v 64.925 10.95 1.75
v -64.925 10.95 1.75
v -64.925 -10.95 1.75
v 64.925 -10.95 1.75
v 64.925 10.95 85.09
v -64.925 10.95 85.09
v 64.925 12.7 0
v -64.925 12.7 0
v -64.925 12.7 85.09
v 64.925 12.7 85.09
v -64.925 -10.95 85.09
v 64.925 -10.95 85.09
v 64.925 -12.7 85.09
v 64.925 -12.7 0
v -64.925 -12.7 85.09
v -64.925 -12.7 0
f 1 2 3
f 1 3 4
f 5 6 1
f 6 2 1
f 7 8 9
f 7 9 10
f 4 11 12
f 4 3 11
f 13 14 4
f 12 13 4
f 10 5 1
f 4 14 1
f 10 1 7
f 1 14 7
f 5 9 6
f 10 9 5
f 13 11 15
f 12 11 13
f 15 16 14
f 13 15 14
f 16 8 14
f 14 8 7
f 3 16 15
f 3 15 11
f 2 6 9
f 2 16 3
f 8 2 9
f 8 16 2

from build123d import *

# Parameters (mm, degrees)
F0_W     = 133.35
F0_H     = 25.4
F1_DEPTH = 85.09
F2_T     = -1.75
F3_DEPTH = 1.75
F4_DEPTH = 1.75


with BuildPart() as f1:
    # F0 (on Top) → F1 (new body)
    with BuildSketch(Plane.XY):
        Rectangle(F0_W, F0_H)
    extrude(amount=F1_DEPTH)

    # F2
    f2_openings = [f1.faces().sort_by_distance(p)[0] for p in [
        (0, 0, 85.09),
    ]]
    offset(amount=F2_T, openings=f2_openings)

    # F3 (cut): a face of the model
    f3_faces = [f1.faces().sort_by_distance(p)[0] for p in [
        (-66.675, 0, 42.545),
    ]]
    extrude(f3_faces, amount=-F3_DEPTH, mode=Mode.SUBTRACT)

    # F4 (cut): a face of the model
    f4_faces = [f1.faces().sort_by_distance(p)[0] for p in [
        (66.675, 0, 42.545),
    ]]
    extrude(f4_faces, amount=-F4_DEPTH, mode=Mode.SUBTRACT)


solid = f1.part
